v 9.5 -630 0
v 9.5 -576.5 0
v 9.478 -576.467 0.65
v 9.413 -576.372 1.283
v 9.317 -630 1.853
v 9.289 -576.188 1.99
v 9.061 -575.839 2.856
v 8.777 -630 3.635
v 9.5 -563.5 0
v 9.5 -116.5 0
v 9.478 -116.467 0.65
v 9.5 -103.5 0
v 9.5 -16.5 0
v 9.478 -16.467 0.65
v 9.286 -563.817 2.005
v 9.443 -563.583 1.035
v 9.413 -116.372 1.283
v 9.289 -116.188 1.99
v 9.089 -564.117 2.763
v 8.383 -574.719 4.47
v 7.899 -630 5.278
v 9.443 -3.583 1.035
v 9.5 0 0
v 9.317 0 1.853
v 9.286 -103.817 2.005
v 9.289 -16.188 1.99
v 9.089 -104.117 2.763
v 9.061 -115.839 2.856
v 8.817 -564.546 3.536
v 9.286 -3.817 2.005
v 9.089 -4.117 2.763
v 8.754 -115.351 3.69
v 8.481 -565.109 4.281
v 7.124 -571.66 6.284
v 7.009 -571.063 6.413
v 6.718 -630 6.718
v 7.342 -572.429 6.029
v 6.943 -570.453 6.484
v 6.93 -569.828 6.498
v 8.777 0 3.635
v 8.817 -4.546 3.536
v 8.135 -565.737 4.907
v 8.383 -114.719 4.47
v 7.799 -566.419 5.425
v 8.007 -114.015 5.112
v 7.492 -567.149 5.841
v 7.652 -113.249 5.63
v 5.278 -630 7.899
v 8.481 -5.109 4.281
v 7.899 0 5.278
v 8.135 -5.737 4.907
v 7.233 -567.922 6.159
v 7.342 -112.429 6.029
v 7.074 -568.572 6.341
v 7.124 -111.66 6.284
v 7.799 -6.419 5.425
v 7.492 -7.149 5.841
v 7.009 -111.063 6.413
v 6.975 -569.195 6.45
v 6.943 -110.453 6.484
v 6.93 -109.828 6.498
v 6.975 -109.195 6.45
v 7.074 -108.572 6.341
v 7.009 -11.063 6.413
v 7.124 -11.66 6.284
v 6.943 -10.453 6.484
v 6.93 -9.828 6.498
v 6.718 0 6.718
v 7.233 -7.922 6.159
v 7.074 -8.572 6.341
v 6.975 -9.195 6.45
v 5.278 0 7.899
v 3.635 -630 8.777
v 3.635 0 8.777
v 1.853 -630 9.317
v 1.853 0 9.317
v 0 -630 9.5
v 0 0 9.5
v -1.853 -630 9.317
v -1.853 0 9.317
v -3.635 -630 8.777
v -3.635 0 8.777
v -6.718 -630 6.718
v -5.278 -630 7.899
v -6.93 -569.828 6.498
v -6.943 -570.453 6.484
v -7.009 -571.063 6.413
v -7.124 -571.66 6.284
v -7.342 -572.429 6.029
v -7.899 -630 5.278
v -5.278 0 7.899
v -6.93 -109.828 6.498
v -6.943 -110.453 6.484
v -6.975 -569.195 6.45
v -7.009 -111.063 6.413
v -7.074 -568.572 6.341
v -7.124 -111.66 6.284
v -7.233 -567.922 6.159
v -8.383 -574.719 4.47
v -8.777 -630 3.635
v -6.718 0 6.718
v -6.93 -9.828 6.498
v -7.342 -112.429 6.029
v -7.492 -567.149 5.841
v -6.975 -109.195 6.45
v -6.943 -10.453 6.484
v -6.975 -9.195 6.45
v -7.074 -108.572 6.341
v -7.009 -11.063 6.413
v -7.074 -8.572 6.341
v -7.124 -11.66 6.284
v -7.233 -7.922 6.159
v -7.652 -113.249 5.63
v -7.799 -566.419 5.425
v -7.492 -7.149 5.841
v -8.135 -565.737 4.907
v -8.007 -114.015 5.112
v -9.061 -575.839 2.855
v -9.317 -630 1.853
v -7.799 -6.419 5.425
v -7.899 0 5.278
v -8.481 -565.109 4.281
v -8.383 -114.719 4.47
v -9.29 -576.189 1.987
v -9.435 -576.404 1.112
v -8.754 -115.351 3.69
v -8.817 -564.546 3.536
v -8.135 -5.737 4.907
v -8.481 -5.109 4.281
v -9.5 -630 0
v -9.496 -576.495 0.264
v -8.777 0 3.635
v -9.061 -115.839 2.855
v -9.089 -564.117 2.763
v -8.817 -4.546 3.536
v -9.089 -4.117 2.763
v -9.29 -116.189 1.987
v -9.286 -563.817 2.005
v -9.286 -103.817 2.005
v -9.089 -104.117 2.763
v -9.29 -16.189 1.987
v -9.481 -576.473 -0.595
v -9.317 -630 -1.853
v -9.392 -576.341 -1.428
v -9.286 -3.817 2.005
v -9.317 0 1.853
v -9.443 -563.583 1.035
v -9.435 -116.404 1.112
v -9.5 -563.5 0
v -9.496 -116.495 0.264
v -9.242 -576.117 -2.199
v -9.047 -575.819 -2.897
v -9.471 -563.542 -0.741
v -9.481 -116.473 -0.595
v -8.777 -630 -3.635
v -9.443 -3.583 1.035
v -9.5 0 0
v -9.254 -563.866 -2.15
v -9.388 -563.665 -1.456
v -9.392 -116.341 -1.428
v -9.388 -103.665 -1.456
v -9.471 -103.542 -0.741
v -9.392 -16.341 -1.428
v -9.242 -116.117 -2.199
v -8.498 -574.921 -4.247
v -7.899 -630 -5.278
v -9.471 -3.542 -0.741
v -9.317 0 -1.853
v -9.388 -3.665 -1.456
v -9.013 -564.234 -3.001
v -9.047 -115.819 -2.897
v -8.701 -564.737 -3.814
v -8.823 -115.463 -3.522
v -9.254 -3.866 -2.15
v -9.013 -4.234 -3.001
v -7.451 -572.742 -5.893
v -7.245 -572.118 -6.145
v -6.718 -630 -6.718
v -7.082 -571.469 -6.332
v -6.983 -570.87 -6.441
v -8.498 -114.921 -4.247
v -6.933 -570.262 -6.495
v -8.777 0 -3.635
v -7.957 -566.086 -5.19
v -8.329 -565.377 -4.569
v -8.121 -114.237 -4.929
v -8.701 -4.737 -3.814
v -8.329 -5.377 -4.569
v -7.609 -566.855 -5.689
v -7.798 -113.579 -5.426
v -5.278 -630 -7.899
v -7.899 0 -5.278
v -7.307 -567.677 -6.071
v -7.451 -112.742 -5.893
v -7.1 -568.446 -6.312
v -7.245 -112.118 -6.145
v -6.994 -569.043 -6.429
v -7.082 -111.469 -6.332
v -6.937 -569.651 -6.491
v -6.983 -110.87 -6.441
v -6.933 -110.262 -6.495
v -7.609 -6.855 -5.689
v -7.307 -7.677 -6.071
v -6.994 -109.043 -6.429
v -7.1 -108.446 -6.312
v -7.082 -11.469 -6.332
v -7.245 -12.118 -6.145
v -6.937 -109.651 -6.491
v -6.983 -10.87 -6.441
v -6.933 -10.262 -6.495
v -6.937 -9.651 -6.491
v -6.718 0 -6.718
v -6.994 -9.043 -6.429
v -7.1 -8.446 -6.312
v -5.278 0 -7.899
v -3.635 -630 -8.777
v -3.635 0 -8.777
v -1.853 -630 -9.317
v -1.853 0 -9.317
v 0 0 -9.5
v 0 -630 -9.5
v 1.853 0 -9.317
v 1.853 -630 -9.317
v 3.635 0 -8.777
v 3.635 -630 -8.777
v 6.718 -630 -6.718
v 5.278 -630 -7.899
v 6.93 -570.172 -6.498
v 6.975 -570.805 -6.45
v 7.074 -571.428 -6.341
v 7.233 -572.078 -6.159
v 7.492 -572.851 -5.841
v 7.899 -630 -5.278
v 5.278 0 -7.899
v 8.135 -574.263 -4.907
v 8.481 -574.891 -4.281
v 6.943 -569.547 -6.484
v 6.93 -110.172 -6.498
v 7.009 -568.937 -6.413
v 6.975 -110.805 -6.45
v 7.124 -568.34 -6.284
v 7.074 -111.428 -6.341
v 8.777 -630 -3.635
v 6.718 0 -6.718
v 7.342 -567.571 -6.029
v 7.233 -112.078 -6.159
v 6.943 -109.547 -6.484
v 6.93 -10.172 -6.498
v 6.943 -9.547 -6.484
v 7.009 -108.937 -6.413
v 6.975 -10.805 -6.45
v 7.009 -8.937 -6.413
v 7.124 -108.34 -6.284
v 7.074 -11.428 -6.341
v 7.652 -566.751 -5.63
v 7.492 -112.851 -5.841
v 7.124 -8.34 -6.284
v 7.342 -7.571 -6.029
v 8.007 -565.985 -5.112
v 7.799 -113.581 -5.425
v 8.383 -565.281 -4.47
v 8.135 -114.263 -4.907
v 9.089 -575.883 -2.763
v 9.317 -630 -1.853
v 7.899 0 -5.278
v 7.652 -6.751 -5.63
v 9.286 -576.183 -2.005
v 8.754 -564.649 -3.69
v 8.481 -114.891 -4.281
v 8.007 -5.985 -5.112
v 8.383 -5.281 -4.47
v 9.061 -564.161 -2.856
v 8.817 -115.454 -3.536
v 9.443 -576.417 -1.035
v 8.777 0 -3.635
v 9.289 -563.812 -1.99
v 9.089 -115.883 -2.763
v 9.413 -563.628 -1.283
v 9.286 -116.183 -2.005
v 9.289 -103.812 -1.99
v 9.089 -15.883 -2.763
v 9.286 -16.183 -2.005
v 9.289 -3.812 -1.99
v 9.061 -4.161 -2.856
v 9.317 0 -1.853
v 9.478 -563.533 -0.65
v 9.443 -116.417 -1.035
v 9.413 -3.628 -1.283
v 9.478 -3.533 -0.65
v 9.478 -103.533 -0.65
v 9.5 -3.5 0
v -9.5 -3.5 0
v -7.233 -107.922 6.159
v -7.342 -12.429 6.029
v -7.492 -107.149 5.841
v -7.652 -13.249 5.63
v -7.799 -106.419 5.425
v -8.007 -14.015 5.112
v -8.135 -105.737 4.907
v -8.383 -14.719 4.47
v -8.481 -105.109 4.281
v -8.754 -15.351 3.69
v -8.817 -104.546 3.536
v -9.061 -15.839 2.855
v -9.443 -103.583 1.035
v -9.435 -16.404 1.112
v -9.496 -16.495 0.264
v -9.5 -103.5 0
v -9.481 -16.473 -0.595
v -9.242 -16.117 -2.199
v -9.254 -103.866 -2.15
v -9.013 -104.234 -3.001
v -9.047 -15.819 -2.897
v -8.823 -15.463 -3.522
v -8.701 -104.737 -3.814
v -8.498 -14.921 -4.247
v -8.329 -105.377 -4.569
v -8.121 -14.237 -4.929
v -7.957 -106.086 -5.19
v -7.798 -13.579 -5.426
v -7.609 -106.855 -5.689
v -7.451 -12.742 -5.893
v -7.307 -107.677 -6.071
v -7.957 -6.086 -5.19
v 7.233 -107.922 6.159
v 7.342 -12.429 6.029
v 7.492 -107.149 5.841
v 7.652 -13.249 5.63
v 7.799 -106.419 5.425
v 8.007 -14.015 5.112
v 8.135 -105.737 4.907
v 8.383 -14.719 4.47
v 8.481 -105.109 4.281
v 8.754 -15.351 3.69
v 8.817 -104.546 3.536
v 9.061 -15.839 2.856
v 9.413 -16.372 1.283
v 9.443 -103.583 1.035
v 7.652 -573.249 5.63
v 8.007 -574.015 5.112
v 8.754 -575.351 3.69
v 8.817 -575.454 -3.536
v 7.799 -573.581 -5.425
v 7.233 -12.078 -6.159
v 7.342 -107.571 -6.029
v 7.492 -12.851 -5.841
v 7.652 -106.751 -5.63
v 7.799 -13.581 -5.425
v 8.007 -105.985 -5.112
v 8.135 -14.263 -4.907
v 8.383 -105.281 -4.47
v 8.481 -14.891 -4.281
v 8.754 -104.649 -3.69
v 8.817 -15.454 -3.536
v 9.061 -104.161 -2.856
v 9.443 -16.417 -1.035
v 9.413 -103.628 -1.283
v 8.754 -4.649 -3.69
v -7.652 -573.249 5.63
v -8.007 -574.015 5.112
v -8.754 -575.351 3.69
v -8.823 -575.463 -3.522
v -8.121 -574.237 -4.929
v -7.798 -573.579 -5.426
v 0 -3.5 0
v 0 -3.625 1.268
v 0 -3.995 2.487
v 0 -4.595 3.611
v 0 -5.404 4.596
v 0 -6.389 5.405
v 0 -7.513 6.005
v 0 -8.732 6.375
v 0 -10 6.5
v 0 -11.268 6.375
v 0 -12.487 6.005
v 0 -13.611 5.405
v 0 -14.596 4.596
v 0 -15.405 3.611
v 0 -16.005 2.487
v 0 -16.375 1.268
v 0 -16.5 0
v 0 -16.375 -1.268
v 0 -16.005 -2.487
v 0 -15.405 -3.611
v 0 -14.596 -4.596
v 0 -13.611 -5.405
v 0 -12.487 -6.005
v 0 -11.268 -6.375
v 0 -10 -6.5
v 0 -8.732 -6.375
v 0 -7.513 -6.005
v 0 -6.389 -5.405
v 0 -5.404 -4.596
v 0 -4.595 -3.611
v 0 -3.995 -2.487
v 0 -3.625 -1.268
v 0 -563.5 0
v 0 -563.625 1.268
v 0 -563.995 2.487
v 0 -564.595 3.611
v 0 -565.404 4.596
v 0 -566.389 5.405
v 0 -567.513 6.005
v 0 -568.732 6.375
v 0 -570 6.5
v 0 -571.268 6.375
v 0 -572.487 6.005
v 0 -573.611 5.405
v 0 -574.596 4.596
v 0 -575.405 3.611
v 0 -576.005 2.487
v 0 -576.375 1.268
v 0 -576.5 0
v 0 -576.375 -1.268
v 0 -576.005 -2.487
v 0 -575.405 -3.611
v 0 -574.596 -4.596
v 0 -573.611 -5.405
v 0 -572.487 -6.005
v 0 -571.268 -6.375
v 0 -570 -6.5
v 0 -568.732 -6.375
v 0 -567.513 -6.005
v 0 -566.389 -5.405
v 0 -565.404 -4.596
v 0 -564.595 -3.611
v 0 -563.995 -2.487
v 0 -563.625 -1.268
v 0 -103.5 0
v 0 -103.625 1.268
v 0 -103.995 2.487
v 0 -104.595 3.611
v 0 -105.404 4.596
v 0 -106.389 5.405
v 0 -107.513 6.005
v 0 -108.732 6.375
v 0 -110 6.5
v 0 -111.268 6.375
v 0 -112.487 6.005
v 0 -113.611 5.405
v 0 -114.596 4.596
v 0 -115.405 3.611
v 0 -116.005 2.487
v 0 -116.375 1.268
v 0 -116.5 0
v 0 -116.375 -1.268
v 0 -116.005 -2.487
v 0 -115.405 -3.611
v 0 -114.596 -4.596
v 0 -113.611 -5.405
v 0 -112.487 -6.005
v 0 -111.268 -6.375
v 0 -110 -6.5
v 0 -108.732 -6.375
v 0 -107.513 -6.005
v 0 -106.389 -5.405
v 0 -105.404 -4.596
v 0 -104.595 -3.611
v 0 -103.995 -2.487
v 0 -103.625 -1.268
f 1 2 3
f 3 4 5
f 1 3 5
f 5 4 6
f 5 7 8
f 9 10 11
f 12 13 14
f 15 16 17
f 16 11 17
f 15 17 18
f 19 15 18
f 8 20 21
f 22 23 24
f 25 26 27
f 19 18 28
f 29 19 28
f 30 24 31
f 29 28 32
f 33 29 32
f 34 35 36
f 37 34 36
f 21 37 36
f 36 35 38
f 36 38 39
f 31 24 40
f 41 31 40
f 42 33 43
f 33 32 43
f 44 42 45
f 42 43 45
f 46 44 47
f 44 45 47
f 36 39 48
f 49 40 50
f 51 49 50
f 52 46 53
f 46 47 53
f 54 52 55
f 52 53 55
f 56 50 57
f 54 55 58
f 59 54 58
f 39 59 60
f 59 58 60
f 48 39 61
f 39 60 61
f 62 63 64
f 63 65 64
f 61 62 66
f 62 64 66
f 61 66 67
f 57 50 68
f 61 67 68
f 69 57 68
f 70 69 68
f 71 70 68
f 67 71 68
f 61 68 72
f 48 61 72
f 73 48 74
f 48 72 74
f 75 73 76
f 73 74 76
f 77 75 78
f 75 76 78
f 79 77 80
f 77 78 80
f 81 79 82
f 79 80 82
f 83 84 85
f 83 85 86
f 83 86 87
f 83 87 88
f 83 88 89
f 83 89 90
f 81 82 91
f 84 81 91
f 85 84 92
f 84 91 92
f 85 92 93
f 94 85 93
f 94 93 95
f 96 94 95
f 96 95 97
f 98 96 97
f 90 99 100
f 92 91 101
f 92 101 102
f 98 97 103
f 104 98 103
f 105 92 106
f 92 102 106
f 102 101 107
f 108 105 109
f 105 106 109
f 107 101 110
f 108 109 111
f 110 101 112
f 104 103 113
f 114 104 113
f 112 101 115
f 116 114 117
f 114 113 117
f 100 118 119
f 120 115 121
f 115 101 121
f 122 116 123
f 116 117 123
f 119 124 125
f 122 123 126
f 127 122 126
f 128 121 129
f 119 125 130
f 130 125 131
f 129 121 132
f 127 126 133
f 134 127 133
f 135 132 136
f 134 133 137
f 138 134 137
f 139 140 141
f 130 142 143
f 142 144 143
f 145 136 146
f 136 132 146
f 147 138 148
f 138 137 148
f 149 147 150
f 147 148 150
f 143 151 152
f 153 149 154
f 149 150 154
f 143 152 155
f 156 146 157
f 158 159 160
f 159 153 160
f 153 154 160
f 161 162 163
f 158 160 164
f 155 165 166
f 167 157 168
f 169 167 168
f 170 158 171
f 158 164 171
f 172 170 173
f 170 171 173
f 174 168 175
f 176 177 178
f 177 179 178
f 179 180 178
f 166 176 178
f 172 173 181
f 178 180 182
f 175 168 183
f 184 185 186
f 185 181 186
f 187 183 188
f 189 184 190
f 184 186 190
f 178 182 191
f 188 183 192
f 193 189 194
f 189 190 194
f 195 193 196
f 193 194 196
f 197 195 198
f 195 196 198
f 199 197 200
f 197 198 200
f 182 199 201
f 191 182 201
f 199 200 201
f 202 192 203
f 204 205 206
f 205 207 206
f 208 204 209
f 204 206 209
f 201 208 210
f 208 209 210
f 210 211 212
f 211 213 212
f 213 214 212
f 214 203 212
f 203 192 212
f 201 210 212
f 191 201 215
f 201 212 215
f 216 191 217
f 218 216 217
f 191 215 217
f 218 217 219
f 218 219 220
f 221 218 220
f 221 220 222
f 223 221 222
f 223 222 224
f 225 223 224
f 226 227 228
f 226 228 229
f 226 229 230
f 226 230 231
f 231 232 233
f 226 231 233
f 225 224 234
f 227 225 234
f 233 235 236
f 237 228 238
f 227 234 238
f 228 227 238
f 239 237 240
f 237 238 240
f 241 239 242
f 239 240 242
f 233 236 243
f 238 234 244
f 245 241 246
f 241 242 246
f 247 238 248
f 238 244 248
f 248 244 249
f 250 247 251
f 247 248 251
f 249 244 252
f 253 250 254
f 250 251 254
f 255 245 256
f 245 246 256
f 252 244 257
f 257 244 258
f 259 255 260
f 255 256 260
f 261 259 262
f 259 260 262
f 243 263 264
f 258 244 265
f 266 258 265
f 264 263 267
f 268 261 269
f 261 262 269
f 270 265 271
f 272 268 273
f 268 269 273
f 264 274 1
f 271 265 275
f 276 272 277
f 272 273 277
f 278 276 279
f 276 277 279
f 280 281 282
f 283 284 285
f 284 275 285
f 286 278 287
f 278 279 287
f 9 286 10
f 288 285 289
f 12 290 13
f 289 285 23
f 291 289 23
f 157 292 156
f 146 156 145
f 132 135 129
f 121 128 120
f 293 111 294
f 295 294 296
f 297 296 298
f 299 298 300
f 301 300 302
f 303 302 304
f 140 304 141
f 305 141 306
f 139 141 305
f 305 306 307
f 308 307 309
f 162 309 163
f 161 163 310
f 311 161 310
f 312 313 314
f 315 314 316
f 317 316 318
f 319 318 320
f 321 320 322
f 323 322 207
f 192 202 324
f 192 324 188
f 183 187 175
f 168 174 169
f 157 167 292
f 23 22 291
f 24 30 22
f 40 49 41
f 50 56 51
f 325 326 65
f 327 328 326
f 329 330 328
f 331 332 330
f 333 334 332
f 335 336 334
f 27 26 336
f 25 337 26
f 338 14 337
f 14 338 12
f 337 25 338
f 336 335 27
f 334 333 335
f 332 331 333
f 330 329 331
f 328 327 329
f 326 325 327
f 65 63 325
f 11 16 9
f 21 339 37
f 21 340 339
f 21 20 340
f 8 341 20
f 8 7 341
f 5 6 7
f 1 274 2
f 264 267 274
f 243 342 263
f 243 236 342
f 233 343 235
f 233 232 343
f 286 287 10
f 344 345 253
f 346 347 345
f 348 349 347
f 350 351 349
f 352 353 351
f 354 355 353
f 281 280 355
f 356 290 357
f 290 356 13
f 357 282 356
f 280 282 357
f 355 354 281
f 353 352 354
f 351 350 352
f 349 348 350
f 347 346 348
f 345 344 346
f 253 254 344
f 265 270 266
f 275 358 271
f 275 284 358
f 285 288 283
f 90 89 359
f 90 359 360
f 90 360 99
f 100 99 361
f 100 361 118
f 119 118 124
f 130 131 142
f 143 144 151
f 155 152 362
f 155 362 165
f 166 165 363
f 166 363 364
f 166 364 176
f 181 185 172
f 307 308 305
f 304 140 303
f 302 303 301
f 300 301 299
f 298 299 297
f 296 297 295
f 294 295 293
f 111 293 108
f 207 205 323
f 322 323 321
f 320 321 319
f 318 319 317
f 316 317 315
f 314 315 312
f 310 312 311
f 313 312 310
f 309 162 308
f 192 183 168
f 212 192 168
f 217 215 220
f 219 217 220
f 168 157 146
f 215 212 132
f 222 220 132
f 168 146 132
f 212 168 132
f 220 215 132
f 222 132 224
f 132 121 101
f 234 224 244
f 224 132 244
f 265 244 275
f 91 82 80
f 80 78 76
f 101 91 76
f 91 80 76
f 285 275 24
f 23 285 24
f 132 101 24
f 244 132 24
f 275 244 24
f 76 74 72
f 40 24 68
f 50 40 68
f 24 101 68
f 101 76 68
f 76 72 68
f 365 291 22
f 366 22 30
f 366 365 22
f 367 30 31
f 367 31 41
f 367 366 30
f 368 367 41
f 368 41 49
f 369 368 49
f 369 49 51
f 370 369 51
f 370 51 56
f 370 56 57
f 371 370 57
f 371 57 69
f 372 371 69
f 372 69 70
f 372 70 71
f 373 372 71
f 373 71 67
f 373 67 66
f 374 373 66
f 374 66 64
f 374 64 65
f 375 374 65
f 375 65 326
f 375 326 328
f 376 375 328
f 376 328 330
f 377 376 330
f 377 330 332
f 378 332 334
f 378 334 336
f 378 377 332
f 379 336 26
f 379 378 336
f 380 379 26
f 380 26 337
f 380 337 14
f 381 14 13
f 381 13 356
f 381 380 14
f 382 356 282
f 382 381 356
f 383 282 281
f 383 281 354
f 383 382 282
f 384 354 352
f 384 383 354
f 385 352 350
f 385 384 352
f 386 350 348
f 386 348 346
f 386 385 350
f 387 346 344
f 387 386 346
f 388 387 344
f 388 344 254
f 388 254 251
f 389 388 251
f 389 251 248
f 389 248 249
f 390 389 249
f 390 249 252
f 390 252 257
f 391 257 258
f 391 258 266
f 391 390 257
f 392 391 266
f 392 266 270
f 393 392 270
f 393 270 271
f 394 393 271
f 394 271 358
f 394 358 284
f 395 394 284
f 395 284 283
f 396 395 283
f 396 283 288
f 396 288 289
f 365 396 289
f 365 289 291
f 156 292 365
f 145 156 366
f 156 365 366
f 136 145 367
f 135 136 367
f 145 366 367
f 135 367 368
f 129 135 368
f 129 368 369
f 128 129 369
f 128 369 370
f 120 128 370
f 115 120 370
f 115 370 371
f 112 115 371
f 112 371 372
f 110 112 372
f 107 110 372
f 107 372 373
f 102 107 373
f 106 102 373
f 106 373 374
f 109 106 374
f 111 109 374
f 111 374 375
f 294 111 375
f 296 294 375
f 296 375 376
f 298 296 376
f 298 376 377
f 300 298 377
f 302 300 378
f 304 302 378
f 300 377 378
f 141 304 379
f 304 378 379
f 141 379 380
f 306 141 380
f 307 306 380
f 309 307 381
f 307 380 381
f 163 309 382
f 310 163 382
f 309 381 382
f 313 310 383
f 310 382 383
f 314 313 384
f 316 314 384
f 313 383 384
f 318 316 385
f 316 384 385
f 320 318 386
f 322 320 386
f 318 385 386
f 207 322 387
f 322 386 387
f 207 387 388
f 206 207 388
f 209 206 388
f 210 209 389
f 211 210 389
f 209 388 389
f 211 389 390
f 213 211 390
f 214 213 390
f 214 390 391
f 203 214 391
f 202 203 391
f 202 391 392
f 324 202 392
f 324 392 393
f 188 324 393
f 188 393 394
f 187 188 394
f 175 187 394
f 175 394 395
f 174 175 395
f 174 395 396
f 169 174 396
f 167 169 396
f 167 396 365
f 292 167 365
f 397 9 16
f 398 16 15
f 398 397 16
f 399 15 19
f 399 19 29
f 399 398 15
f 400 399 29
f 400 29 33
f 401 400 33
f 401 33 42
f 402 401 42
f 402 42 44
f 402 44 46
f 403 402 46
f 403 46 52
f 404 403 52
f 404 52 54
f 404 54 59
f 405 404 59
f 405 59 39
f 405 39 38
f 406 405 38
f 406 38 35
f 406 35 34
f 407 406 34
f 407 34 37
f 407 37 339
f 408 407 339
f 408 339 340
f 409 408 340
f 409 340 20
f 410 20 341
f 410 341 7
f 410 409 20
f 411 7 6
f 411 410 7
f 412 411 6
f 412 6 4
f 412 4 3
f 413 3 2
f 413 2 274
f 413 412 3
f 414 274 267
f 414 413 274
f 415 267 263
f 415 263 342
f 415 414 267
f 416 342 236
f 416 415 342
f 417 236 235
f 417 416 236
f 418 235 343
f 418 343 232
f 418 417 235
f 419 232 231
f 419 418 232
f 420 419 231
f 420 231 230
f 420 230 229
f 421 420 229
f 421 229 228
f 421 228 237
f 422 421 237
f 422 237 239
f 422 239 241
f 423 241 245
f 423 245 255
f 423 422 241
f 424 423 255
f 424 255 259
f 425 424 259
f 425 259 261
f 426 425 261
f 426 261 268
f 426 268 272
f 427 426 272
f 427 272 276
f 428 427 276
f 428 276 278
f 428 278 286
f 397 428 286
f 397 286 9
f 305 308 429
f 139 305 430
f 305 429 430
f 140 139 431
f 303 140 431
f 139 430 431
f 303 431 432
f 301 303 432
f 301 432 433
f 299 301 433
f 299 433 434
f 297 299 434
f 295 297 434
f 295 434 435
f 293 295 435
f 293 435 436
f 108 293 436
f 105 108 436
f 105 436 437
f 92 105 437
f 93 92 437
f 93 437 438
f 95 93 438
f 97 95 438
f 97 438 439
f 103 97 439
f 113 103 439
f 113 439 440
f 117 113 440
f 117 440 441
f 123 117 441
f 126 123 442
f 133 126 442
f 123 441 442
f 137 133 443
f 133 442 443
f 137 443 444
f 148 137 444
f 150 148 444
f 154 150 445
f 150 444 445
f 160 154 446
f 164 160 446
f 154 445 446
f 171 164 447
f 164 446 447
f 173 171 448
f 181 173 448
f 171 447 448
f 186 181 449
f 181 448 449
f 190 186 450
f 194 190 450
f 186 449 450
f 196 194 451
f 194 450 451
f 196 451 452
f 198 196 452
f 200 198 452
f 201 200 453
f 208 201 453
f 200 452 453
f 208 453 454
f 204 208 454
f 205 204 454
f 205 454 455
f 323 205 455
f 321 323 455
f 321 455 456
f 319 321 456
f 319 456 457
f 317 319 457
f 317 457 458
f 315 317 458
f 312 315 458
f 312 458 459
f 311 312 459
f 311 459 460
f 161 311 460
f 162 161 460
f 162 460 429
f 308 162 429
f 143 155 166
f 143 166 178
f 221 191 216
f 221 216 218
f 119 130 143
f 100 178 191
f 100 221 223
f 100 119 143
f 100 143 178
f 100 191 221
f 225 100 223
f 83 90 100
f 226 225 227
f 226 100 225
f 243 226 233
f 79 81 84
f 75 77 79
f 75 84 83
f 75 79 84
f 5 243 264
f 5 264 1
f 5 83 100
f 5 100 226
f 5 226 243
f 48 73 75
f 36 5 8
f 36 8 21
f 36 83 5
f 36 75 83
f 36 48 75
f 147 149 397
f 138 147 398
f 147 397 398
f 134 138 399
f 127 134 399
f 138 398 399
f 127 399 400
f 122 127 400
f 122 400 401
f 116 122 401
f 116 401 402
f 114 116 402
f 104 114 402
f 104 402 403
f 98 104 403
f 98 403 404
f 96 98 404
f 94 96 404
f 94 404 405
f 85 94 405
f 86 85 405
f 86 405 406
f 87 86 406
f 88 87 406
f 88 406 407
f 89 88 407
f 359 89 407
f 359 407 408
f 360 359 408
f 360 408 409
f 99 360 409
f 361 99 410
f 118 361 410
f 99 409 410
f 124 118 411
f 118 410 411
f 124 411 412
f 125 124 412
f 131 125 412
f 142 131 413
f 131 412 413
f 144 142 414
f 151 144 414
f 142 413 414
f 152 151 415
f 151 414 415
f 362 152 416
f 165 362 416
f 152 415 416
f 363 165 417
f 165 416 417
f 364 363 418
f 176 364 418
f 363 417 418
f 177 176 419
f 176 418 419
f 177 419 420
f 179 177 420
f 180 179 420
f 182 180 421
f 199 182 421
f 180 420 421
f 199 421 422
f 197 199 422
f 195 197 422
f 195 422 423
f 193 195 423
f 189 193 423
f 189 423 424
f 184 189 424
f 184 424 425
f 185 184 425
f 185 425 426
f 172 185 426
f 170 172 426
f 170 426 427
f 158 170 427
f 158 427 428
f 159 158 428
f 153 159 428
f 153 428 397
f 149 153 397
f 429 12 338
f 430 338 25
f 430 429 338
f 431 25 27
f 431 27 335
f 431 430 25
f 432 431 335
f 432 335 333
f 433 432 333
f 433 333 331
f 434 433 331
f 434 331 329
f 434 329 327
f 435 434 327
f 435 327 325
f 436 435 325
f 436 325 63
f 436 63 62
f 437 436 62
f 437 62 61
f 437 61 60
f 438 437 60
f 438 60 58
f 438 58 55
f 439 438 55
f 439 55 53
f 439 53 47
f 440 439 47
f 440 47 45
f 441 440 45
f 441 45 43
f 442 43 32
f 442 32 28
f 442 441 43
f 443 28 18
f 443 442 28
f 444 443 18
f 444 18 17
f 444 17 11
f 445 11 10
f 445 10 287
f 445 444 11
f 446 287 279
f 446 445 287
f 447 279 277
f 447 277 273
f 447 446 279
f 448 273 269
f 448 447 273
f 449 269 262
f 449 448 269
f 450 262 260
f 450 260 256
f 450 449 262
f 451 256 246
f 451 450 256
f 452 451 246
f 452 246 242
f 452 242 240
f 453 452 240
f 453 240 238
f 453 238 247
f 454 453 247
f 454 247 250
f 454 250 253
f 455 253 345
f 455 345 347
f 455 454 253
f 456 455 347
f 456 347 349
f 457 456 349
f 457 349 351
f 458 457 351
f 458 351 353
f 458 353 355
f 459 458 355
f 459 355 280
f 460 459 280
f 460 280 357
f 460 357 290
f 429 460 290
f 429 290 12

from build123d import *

# Parameters (mm, degrees)
F0_R          = 9.5
F1_DEPTH      = 630
F2_R          = 6.5
F3_DEPTH      = 25
F3_DEPTH_BACK = 25


with BuildPart() as f1:
    # F0 (on Front) → F1 (new body)
    with BuildSketch(Plane.XZ):
        Circle(F0_R)
    extrude(amount=F1_DEPTH)

    # F2 (on Right) → F3 (cut, two sides)
    with BuildSketch(Plane.YZ) as f3_sk:
        with Locations((-10, 0)):
            Circle(F2_R)
        with Locations((-110, 0)):
            Circle(F2_R)
        with Locations((-570, 0)):
            Circle(F2_R)
    extrude(amount=F3_DEPTH, mode=Mode.SUBTRACT)
    extrude(f3_sk.sketch, amount=-F3_DEPTH_BACK, mode=Mode.SUBTRACT)


solid = f1.part
